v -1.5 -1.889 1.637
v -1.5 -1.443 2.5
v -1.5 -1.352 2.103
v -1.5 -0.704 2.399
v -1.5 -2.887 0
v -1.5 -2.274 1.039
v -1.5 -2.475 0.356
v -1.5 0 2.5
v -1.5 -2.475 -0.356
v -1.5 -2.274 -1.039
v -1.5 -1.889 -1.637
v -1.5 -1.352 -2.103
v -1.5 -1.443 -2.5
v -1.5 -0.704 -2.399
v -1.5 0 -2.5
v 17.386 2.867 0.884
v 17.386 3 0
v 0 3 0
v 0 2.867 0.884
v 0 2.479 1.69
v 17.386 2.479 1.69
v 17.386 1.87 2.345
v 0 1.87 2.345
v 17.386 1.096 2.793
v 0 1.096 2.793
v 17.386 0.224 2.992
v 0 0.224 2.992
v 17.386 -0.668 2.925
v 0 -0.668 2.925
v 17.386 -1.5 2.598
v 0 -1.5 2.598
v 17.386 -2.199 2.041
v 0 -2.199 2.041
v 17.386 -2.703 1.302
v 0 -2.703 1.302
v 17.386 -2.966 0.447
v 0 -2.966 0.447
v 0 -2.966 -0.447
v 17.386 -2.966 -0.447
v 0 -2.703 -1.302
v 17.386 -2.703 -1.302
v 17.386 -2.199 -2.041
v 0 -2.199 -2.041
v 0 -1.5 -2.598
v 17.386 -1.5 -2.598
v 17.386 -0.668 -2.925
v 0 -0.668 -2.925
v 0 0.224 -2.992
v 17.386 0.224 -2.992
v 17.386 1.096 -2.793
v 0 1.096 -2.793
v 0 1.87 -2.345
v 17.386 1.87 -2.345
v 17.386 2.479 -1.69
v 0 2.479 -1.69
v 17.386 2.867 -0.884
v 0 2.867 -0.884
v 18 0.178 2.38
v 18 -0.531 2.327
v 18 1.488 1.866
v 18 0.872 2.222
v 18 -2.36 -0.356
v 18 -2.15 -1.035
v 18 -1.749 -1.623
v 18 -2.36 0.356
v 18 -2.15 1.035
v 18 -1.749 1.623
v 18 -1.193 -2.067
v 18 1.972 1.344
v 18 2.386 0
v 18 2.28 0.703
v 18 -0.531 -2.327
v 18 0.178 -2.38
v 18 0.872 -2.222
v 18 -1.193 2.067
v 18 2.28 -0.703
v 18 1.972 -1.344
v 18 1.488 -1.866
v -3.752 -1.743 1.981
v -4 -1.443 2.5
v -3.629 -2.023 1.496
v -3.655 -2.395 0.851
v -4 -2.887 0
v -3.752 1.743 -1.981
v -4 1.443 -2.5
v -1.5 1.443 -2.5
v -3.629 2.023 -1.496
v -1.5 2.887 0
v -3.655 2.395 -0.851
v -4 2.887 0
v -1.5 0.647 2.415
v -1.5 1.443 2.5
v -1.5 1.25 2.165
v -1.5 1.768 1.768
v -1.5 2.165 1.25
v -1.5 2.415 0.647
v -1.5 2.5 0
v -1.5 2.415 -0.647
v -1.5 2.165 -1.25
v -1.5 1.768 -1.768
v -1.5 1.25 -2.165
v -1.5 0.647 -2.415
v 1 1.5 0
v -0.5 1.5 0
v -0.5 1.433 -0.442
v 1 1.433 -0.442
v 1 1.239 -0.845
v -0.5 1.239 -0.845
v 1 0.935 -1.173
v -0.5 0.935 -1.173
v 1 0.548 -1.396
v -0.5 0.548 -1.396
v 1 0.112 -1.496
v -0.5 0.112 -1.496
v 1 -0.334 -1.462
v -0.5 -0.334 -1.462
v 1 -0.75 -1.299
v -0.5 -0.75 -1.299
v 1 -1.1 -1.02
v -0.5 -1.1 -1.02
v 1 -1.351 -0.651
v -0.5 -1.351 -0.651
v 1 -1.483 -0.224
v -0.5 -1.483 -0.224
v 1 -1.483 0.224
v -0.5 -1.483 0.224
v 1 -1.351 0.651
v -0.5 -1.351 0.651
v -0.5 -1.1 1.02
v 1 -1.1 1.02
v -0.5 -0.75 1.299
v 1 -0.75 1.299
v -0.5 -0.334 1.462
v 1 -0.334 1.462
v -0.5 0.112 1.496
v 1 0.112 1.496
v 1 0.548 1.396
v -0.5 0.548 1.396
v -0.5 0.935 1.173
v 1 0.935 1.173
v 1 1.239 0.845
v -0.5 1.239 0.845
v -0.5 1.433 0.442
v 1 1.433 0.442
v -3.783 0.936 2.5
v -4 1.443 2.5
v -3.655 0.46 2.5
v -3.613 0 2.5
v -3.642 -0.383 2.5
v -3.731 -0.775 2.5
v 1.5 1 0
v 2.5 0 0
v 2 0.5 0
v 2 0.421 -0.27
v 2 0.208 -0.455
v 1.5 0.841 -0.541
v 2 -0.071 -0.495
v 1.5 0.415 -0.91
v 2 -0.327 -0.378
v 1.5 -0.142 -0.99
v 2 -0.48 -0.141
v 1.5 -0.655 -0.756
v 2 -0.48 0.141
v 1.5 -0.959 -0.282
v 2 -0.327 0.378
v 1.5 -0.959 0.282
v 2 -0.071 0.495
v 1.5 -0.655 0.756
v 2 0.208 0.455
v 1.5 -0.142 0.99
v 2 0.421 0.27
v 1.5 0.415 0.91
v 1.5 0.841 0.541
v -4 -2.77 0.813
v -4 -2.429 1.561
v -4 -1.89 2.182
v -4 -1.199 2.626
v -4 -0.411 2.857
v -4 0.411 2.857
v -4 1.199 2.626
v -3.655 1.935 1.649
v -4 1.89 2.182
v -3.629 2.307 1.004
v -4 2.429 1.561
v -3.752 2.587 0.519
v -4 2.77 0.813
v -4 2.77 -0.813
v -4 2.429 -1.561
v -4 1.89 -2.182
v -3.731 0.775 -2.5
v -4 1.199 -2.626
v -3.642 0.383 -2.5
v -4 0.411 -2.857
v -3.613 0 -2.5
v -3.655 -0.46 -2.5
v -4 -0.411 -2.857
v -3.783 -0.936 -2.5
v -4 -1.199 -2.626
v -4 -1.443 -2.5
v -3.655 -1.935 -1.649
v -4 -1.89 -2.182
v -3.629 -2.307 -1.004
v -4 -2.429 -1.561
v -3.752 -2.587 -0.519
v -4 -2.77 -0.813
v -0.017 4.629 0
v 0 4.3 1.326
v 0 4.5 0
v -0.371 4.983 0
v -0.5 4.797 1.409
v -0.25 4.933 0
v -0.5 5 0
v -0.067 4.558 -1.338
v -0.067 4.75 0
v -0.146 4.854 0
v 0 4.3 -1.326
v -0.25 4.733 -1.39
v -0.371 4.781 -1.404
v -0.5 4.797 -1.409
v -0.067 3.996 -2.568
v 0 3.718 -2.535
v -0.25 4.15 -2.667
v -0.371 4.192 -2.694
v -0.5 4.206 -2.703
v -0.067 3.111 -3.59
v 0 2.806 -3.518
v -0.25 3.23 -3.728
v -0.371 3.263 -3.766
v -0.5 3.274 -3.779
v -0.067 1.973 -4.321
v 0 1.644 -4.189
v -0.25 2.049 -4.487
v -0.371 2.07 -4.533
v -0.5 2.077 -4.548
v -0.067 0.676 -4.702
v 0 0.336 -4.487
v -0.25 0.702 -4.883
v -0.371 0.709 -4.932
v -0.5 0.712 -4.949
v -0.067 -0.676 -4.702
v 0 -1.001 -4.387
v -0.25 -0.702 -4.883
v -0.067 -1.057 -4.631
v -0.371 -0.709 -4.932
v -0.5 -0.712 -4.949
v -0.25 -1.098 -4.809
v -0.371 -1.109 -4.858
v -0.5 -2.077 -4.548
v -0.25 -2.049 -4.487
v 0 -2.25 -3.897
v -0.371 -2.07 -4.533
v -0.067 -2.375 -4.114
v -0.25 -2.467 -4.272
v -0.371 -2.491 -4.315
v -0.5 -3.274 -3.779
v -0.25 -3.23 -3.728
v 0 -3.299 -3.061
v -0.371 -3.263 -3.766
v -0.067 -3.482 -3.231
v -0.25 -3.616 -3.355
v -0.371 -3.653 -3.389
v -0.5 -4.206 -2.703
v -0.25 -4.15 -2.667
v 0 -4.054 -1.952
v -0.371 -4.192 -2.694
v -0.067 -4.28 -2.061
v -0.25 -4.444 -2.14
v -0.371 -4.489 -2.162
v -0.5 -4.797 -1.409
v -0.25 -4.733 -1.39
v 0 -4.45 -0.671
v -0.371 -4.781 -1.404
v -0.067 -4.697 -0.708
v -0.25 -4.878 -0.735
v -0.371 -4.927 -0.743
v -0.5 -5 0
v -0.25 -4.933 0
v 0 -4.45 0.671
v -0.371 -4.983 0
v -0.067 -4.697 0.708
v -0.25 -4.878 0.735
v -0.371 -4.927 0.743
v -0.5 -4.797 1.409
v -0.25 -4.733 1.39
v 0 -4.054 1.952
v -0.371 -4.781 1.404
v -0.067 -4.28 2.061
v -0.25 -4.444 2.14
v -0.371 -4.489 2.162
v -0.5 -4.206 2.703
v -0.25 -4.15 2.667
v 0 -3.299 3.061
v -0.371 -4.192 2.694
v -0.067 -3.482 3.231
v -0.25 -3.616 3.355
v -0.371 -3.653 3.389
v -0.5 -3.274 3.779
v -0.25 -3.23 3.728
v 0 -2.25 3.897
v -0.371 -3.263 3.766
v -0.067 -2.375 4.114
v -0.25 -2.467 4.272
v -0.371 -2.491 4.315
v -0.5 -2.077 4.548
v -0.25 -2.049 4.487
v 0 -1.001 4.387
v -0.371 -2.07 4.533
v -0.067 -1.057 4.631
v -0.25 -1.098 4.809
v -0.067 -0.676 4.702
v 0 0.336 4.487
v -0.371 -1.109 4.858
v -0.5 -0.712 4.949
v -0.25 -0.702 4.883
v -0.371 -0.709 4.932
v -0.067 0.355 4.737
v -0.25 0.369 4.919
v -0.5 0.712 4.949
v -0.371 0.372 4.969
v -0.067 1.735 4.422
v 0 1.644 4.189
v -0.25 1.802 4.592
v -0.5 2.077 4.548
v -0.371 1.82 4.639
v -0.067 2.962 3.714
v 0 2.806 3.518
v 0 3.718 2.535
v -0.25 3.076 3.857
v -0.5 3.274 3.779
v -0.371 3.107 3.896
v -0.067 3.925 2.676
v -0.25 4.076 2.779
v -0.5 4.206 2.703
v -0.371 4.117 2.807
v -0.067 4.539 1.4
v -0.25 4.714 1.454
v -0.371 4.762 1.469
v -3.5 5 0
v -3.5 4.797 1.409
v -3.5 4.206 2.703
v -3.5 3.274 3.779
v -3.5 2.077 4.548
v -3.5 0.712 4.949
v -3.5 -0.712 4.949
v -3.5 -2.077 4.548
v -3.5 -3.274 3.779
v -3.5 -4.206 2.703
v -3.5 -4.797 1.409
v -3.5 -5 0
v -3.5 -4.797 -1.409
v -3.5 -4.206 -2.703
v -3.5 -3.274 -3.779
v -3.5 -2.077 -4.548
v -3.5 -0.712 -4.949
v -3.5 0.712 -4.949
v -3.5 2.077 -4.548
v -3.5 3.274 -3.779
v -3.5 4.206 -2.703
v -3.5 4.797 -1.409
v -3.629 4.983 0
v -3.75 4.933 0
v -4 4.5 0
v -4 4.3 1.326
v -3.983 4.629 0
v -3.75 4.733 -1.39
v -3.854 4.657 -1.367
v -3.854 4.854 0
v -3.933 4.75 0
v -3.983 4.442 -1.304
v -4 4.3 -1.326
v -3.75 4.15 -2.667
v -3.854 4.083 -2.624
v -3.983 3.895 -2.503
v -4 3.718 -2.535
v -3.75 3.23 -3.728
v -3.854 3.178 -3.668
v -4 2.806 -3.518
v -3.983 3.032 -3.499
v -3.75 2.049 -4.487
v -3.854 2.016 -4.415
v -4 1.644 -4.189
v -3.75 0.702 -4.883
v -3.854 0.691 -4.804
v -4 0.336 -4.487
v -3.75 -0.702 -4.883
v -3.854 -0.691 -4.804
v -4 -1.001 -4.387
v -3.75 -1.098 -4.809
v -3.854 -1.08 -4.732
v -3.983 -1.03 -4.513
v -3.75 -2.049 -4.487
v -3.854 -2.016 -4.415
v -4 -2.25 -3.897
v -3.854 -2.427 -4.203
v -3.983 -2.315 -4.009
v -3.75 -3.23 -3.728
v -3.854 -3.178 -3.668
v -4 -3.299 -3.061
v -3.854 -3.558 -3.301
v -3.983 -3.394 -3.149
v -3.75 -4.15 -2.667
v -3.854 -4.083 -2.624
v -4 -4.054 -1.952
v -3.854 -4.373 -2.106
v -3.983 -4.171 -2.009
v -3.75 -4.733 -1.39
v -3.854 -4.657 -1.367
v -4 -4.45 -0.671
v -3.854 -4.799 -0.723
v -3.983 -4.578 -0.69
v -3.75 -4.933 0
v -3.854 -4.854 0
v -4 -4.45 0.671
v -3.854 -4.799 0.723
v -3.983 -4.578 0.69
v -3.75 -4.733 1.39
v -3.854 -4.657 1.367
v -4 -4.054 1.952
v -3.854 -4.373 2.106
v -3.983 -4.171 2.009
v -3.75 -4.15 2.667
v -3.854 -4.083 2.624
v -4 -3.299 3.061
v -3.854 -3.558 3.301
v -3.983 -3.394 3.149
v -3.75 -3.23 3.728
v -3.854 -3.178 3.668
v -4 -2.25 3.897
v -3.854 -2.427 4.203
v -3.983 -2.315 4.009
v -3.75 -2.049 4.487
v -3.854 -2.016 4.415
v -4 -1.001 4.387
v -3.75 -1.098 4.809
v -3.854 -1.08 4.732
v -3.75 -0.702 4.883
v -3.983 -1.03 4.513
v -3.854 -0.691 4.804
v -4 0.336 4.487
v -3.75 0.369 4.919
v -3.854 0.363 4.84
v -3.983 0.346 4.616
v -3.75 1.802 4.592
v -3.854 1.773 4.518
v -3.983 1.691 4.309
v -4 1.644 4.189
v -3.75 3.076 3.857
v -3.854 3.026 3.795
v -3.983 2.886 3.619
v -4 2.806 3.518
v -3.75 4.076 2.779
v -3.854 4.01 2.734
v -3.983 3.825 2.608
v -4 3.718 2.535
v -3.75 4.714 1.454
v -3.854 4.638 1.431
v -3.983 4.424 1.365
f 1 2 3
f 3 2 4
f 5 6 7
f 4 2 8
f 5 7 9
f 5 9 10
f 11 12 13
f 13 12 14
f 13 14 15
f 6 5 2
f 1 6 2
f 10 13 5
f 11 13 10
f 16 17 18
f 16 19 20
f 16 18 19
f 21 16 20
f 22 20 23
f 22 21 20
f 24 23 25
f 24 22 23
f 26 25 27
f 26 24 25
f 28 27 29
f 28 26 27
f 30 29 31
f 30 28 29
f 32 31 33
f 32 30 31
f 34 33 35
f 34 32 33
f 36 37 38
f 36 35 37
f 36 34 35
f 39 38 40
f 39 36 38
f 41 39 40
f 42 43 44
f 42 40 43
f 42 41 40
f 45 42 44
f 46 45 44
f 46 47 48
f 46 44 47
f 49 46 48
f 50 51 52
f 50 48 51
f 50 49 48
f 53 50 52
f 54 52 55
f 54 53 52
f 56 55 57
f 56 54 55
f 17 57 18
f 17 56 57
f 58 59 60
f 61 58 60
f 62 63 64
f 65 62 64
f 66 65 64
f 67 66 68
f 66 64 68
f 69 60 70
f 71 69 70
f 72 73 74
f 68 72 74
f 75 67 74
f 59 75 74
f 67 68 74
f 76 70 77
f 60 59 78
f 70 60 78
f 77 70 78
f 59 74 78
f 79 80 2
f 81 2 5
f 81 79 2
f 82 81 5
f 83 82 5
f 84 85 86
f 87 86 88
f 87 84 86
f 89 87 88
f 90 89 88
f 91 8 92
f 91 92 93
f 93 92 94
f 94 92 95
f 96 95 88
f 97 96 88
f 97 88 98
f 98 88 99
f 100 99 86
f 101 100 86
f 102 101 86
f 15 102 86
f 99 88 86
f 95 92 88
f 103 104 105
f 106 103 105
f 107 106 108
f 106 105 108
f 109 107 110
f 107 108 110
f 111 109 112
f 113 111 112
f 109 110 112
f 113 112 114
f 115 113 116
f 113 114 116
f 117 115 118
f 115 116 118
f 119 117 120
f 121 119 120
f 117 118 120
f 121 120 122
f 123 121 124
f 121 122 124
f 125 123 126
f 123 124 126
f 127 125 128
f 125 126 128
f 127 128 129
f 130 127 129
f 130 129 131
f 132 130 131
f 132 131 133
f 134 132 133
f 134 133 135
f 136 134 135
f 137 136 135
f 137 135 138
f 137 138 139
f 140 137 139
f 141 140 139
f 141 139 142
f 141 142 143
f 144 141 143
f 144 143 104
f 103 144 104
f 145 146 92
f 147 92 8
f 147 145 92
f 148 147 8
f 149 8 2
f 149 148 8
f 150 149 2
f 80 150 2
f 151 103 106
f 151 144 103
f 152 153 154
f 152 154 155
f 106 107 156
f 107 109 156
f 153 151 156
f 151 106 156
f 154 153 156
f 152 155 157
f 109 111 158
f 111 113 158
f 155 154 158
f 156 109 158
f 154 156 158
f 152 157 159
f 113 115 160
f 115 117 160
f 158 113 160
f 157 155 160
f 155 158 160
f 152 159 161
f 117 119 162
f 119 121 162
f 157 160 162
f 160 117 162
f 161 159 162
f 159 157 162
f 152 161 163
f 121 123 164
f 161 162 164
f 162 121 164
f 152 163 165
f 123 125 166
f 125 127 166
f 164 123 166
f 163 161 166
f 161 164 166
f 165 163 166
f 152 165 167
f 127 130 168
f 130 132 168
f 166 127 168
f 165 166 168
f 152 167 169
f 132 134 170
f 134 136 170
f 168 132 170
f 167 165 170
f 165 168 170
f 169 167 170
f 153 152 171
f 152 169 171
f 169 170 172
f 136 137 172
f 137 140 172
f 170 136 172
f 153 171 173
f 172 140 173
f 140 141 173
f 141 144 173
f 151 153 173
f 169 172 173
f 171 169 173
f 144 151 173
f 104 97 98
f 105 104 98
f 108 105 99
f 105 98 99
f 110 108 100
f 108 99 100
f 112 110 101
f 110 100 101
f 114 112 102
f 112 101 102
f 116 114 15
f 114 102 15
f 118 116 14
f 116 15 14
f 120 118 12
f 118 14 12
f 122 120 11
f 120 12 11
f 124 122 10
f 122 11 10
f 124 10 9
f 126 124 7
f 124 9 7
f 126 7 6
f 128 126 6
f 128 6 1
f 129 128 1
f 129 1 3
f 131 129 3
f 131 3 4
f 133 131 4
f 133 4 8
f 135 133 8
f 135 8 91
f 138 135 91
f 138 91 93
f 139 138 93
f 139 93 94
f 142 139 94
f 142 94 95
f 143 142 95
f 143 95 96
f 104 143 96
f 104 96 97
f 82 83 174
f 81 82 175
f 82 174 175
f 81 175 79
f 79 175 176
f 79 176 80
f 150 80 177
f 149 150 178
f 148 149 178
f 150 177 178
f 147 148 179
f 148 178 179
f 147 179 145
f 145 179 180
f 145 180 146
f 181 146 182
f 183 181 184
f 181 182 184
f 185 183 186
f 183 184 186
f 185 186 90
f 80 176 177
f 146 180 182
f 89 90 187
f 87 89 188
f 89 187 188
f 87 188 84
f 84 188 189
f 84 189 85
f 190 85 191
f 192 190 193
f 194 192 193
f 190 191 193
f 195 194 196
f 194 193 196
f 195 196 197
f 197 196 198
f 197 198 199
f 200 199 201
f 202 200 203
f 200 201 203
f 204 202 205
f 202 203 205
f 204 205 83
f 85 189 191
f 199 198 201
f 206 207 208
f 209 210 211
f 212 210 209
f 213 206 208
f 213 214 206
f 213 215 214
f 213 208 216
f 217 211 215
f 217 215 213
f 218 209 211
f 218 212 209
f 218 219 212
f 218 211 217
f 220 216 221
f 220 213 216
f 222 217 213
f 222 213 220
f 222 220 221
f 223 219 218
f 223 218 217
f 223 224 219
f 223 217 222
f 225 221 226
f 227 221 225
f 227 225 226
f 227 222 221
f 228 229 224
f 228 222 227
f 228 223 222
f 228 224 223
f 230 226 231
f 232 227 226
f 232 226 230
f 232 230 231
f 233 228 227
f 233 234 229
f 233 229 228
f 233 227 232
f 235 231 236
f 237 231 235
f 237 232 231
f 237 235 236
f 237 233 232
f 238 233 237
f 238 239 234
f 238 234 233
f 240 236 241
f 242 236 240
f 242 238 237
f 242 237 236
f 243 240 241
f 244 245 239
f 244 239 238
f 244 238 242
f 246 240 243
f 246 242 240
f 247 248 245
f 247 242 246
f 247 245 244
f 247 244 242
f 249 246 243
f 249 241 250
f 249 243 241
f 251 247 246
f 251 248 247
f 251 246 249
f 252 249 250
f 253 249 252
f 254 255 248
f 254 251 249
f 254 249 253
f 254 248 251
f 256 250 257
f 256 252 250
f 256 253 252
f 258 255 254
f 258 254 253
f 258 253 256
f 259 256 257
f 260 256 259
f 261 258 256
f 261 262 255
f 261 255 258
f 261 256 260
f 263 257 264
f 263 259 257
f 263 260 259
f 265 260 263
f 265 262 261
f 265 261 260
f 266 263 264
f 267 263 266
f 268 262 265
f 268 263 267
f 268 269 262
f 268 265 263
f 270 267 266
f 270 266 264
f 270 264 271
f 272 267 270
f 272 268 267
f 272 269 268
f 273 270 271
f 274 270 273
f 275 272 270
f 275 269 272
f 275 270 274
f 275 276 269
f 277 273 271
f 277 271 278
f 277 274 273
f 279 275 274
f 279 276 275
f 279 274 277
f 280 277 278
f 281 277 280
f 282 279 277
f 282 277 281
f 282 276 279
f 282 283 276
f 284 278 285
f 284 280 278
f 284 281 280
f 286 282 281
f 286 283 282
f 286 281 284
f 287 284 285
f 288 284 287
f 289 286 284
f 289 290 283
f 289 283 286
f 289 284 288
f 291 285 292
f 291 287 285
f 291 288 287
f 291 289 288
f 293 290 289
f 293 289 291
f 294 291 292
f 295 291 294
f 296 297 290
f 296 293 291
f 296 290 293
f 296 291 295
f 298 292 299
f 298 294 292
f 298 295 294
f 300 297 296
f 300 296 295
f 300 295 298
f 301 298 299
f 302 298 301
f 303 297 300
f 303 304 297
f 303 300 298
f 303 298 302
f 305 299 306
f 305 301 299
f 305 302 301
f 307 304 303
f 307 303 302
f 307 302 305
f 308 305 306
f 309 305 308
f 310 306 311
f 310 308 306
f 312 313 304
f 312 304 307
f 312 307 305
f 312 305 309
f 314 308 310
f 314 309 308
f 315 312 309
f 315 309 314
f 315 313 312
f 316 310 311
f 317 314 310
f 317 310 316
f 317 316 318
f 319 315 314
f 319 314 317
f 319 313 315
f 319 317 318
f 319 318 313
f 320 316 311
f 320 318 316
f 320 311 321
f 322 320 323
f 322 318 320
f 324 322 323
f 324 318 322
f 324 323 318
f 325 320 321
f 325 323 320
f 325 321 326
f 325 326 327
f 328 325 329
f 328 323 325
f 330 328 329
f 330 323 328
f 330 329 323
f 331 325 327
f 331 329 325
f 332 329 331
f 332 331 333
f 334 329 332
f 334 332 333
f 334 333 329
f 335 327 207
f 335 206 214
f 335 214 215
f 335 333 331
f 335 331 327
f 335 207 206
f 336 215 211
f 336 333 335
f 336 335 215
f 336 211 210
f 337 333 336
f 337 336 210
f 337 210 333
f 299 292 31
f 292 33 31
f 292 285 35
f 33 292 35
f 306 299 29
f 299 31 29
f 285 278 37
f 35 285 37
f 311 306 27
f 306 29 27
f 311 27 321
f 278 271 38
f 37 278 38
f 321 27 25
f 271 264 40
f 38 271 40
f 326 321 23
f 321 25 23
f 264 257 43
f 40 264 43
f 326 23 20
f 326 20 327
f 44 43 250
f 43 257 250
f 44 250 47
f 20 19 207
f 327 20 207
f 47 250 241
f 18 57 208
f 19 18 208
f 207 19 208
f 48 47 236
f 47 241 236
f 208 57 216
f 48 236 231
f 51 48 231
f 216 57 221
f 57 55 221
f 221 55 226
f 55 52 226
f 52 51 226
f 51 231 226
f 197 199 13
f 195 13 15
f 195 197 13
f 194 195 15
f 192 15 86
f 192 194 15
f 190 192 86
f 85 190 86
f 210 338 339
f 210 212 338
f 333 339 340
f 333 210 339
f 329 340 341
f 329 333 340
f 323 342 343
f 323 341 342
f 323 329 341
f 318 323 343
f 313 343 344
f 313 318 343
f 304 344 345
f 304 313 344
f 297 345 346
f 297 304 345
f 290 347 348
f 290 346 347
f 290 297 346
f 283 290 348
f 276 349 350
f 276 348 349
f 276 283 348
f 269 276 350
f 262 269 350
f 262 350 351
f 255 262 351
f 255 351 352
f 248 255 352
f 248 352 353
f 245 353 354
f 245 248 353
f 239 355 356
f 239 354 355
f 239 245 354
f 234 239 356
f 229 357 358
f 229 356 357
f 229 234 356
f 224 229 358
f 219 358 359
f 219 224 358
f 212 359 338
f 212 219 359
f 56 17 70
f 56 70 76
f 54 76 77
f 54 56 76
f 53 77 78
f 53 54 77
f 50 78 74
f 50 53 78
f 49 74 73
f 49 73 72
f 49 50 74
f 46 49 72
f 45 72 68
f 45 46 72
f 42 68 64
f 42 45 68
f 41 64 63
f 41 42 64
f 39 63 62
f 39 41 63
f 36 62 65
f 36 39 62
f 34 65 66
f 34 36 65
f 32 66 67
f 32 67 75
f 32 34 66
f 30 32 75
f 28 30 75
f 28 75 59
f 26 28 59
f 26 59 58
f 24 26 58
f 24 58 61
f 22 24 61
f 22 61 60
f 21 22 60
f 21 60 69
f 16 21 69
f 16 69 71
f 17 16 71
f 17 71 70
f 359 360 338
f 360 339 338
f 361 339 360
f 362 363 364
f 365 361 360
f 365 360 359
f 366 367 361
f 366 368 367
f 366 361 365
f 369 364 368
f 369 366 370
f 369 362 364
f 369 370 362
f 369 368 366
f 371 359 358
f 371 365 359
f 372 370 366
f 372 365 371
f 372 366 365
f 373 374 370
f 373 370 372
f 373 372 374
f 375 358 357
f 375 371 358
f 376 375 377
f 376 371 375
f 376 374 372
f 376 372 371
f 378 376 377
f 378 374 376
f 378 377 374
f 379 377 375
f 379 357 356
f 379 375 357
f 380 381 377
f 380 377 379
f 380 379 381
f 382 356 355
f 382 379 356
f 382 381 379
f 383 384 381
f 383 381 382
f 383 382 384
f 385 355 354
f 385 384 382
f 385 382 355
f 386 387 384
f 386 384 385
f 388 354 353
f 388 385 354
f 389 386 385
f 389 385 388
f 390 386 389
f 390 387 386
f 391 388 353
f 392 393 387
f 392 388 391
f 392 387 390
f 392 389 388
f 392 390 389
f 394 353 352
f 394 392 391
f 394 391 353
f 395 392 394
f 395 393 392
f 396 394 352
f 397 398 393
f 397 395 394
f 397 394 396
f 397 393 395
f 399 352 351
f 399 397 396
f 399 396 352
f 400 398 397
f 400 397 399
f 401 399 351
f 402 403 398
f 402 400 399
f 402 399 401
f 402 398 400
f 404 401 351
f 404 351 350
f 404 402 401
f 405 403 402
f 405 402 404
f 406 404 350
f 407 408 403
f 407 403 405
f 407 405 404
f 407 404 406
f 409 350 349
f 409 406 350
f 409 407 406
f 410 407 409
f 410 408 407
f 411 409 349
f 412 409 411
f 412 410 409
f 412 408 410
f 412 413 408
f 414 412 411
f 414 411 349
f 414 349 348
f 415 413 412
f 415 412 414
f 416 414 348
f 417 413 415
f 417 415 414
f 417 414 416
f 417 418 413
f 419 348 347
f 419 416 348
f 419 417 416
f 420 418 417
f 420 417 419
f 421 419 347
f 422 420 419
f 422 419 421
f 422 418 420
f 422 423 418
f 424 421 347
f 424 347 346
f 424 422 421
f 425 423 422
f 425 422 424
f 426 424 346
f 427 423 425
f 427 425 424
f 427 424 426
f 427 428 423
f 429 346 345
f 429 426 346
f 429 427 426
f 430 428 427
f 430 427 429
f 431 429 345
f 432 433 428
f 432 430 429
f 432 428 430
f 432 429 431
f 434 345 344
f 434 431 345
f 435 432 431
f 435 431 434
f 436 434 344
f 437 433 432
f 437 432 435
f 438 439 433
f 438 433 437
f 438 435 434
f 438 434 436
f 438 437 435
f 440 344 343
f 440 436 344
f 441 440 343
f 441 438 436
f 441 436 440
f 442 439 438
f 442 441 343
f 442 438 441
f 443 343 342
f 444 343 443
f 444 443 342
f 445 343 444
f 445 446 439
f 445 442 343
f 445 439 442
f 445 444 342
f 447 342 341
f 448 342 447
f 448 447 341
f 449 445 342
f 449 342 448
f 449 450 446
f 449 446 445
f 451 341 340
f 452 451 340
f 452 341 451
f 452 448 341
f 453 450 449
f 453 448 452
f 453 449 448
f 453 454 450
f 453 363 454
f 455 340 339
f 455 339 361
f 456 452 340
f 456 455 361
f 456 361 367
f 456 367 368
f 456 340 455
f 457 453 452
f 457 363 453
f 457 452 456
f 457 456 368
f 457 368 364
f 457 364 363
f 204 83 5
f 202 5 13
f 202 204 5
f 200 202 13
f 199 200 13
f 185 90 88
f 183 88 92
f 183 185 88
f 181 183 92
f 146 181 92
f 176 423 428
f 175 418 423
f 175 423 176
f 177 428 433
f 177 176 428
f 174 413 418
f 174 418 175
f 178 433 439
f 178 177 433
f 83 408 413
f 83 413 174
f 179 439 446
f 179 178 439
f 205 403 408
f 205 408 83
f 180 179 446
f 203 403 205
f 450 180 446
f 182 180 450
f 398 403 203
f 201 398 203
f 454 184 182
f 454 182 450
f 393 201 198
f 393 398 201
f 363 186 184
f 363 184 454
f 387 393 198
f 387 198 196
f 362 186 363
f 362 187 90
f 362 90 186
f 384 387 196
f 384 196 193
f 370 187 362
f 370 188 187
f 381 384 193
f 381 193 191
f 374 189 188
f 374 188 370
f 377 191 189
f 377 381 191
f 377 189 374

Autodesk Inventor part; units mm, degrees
sketch "Sketch_1" plane through (0, 0, 0) normal (0, 0, 1) x (1, 0, 0)
  line L0 (18, 0) -> (2.5, 0)
  line L1 (2.5, 0) -> (1, 1.5)
  line L2 (1, 1.5) -> (-0.5, 1.5)
  line L3 (-0.5, 1.5) -> (-1.5, 2.5)
  line L4 (-1.5, 2.5) -> (-3.6132, 2.5)
  line L5 (-3.6132, 2.5) -> (-4, 2.8868)
  line L6 (-4, 2.8868) -> (-4, 4.5)
  arc A0 (-3.5, 5) -> (-4, 4.5) centre (-3.5, 4.5) ccw
  line L7 (-3.5, 5) -> (-0.5, 5)
  arc A1 (0, 4.5) -> (-0.5, 5) centre (-0.5, 4.5) ccw
  line L8 (0, 4.5) -> (0, 3)
  line L9 (0, 3) -> (17.3865, 3)
  line L10 (17.3865, 3) -> (18, 2.3865)
  line L11 (18, 2.3865) -> (18, 0)
  line L12 (18, 0) -> (2.5, 0)
revolve "Revolution1" add sketch "Sketch_1" angle 360 about axis through (18, 0, 0) along (-1, 0, 0)
thread "Thread1" size "M6x1" class "6g" standard "ISO Metric profile" length 11.8865
sketch "Sketch_2" plane through (-4, 0, 0) normal (1, 0, 0) x (0, 0, -1)
  line L0 (-2.5, -1.4434) -> (0, -2.8868)
  line L1 (0, -2.8868) -> (2.5, -1.4434)
  line L2 (2.5, -1.4434) -> (2.5, 1.4434)
  line L3 (2.5, 1.4434) -> (0, 2.8868)
  line L4 (0, 2.8868) -> (-2.5, 1.4434)
  line L5 (-2.5, 1.4434) -> (-2.5, -1.4434)
extrude "Extrusion1" cut sketch "Sketch_2" along normal blind 2.5
ref_plane "MONTAGE_XY" through (0, 0, 0) normal (1, 0, 0) x (0, 0, -1)
ref_plane "MONTAGE_YZ" through (0, 0, 0) normal (0, 0, -1) x (0, 1, 0)
ref_plane "MONTAGE_ZX" through (0, 0, 0) normal (0, 1, 0) x (1, 0, 0)
ref_plane "Schrauben_punkt_XY" through (18, 0, 0) normal (-1, 0, 0) x (0, 0, -1)
ref_plane "Schrauben_punkt_YZ" through (18, 0, 0) normal (0, 0, -1) x (0, -1, 0)
ref_plane "Schrauben_punkt_ZX" through (18, 0, 0) normal (0, -1, 0) x (-1, 0, 0)
properties part number "DIN-6912 - M6x18(F)"
